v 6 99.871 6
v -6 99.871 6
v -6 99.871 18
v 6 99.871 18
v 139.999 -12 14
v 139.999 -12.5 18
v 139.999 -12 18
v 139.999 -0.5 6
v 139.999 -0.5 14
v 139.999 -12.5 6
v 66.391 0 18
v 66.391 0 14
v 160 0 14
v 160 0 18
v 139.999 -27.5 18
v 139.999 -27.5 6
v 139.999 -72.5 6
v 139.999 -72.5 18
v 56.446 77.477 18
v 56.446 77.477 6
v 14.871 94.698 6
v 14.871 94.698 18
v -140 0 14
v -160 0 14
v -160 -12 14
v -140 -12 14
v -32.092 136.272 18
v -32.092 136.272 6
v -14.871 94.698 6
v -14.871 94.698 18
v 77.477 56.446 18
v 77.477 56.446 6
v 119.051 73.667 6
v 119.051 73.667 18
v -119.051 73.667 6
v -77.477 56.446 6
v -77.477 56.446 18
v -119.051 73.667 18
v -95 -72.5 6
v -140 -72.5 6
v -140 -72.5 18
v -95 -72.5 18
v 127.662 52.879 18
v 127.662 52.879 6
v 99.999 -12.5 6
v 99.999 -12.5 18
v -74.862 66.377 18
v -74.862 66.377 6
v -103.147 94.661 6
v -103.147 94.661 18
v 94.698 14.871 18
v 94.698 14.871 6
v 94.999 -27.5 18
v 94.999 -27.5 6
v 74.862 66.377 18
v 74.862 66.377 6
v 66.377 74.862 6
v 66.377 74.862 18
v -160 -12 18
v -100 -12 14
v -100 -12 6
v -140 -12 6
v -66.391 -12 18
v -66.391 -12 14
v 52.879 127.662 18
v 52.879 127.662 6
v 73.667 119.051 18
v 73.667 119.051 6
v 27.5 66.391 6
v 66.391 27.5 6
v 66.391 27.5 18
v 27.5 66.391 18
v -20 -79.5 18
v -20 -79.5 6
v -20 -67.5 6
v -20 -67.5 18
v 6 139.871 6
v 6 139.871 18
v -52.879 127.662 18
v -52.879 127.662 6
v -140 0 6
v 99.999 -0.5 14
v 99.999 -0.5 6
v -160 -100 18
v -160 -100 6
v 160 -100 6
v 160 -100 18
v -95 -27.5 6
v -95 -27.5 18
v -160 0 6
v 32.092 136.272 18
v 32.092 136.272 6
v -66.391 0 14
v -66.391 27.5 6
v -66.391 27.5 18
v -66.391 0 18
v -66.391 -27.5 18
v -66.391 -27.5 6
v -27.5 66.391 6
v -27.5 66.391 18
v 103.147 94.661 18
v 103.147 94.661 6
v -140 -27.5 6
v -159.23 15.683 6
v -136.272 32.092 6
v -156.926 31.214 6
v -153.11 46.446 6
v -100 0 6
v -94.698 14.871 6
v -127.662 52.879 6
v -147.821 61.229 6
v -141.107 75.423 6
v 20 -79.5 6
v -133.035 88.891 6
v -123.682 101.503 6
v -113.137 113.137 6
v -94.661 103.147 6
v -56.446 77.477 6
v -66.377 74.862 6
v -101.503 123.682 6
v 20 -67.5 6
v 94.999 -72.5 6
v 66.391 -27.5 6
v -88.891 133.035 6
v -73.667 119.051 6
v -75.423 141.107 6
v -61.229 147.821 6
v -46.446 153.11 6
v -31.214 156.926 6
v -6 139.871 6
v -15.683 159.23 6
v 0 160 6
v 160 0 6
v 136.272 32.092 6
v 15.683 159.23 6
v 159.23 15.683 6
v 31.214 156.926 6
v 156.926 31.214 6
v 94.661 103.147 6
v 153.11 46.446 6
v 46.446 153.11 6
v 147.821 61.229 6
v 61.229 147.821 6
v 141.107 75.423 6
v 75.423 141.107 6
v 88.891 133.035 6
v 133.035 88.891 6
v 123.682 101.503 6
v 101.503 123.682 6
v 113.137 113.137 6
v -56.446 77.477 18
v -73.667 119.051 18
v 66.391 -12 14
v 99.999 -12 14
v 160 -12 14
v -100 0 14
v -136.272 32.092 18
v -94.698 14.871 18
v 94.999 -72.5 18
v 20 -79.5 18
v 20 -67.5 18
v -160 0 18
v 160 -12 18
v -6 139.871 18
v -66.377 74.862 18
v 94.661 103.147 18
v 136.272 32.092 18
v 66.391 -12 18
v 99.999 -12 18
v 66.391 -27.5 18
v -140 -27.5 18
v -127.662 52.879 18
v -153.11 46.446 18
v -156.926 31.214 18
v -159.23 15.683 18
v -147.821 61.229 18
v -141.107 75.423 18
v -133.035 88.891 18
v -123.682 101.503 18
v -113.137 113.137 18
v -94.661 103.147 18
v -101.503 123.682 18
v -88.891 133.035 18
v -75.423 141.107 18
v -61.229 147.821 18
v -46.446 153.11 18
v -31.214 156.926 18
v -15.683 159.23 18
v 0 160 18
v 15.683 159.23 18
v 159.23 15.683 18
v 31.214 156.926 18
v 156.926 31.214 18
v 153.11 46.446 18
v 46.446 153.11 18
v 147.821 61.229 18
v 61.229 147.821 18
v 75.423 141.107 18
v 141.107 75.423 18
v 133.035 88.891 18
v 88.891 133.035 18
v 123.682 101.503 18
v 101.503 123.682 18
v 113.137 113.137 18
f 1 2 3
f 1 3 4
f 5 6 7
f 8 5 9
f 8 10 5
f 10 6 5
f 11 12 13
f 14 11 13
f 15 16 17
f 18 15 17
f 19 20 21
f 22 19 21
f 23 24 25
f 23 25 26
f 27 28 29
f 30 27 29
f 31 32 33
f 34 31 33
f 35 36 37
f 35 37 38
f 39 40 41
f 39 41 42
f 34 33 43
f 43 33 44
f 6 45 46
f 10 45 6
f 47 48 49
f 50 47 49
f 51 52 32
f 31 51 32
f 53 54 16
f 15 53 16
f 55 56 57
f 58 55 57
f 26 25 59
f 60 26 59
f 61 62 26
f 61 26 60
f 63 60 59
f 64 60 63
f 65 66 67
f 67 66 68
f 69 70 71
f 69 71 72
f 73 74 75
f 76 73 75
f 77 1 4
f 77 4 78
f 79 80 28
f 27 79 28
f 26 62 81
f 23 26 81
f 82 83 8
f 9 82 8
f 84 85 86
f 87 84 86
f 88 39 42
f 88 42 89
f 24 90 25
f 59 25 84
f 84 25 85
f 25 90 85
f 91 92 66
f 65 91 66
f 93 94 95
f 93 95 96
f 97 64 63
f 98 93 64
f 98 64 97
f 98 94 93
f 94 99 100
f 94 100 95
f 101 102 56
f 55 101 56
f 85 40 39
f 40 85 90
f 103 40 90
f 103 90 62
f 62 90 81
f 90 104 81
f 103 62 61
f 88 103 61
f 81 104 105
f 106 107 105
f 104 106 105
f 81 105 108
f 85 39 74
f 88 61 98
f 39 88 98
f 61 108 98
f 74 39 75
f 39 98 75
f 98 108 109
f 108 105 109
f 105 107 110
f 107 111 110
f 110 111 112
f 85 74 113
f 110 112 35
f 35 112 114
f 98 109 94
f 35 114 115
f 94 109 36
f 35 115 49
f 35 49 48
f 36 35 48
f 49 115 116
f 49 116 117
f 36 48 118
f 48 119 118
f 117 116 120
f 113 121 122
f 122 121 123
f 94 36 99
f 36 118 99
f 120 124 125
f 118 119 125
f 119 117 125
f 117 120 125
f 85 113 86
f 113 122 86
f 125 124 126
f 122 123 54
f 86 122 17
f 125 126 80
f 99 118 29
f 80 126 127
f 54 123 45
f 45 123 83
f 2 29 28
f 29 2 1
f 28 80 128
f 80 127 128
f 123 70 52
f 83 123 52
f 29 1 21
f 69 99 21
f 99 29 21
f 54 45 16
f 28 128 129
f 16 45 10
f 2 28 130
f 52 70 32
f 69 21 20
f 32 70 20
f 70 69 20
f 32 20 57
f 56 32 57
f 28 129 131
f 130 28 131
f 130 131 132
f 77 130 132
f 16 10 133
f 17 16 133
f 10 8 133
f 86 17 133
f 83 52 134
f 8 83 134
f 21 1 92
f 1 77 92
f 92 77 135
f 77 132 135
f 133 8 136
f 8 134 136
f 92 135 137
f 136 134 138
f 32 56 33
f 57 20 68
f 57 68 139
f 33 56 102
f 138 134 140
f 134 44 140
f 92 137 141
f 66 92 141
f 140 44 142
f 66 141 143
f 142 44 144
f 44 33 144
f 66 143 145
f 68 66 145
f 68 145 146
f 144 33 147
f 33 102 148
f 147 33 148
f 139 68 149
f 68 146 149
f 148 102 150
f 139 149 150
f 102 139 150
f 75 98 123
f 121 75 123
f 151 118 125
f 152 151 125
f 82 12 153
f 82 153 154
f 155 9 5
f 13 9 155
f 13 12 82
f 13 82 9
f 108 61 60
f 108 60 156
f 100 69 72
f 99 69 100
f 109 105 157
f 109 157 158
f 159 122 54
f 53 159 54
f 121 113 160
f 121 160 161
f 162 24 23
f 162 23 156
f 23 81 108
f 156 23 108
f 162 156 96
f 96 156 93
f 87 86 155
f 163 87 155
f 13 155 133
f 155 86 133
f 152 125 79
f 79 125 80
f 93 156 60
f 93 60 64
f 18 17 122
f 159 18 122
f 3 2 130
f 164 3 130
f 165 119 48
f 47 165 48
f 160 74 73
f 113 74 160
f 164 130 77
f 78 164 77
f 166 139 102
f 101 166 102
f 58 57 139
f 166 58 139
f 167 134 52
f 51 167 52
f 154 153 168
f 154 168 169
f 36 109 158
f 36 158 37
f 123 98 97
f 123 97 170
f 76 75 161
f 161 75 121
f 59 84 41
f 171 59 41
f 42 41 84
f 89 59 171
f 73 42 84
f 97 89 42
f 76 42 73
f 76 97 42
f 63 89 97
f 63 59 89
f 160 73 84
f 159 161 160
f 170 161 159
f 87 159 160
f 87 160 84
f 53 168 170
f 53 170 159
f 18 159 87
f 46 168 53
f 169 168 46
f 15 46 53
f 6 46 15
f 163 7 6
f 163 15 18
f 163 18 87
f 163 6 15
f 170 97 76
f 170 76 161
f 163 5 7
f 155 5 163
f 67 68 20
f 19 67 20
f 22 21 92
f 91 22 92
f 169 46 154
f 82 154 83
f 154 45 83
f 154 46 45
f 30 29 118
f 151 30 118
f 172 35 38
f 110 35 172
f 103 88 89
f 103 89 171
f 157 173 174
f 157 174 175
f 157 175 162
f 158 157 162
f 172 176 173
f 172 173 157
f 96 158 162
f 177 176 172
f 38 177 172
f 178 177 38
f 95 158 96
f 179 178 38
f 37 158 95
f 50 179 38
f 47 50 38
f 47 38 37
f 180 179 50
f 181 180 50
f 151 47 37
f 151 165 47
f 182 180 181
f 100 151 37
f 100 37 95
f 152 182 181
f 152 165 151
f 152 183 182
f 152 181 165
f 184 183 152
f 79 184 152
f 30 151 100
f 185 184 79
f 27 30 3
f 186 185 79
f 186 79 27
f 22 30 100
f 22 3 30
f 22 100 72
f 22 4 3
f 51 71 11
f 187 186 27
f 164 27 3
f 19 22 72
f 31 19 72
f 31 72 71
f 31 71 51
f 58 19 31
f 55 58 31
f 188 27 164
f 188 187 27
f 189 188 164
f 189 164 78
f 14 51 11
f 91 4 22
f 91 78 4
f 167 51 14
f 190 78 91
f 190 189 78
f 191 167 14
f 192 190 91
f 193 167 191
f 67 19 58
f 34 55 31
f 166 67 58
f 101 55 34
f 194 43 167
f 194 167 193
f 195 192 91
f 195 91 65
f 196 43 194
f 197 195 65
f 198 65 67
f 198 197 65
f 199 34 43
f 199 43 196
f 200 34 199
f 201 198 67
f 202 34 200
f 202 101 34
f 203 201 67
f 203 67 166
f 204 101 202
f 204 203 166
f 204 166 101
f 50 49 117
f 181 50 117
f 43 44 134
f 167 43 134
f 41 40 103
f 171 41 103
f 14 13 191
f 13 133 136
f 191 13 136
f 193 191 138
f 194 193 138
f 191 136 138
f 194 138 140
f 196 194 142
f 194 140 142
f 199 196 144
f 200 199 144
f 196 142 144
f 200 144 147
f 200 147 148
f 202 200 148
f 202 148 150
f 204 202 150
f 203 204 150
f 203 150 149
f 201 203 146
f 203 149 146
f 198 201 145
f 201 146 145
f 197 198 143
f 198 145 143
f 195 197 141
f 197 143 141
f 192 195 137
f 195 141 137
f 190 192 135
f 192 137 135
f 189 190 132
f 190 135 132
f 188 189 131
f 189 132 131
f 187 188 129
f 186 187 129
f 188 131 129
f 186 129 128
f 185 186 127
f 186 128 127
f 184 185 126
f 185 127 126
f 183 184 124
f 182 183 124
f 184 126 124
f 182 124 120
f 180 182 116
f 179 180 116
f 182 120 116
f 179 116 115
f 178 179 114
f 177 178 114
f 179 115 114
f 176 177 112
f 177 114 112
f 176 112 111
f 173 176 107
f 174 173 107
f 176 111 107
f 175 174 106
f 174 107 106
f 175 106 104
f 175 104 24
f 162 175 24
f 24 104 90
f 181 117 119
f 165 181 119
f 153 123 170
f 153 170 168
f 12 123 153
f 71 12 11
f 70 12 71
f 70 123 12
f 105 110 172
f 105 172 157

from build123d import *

# Parameters (mm, degrees)
SKETCH012_W      = 320
SKETCH012_H      = 12
EXTRUDE001_DEPTH = 4
SKETCH007_W      = 12
SKETCH007_H      = 40
SKETCH007_W_2    = 40
SKETCH007_H_2    = 12
EXTRUDE_DEPTH    = 12


with BuildPart() as innertemplatealignmentslot:
    # Sketch012 → Extrude001 (new body)
    with BuildSketch(Plane.XY):
        with Locations((0, -6)):
            Rectangle(SKETCH012_W, SKETCH012_H)
    extrude(amount=EXTRUDE001_DEPTH)


with BuildPart() as innertemplatealignmentslot_1:
    # Extrude001 placement: moved
    add(innertemplatealignmentslot.part.moved(Location((0, 0, 8))))


with BuildPart() as innertemplate:
    # Sketch007 → Extrude (new body)
    with BuildSketch(Plane.XY):
        with BuildLine():
            ThreePointArc((160, 0), (0, 160), (-160, 0))
            Line((-160, 0), (-160, -100))
            Line((-160, -100), (160, -100))
            Line((160, -100), (160, 0))
        make_face()
        Polygon((-140, -72.5), (-95, -72.5), (-95, -27.5), (-140, -27.5), (-140, -50), align=None, mode=Mode.SUBTRACT)
        Polygon((-136.272177, 32.091959), (-94.697598, 14.871205), (-77.476843, 56.445784), (-119.051422, 73.666538), (-127.6618, 52.879249), align=None, mode=Mode.SUBTRACT)
        Polygon((-32.091959, 136.272177), (-14.871205, 94.697598), (-56.445784, 77.476843), (-73.666538, 119.051422), (-52.879249, 127.6618), align=None, mode=Mode.SUBTRACT)
        Polygon((73.666538, 119.051422), (56.445784, 77.476843), (14.871205, 94.697598), (32.091959, 136.272177), (52.879249, 127.6618), align=None, mode=Mode.SUBTRACT)
        Polygon((136.272177, 32.091959), (94.697598, 14.871205), (77.476843, 56.445784), (119.051422, 73.666538), (127.6618, 52.879249), align=None, mode=Mode.SUBTRACT)
        Polygon((94.999107, -27.5), (139.999107, -27.5), (139.999107, -50), (139.999107, -72.5), (94.999107, -72.5), align=None, mode=Mode.SUBTRACT)
        Polygon((66.390873, -27.5), (66.390873, 27.5), (27.5, 66.390873), (-27.5, 66.390873), (-66.390873, 27.5), (-66.390873, -27.5), align=None, mode=Mode.SUBTRACT)
        Polygon((-94.661353, 103.146635), (-66.377082, 74.862363), (-74.862363, 66.377082), (-103.146635, 94.661353), (-98.903994, 98.903994), align=None, mode=Mode.SUBTRACT)
        with Locations((0, 119.871369)):
            Rectangle(SKETCH007_W, SKETCH007_H, mode=Mode.SUBTRACT)
        Polygon((103.146635, 94.661353), (74.862363, 66.377082), (66.377082, 74.862363), (94.661353, 103.146635), (98.903994, 98.903994), align=None, mode=Mode.SUBTRACT)
        with Locations((-120, -6)):
            Rectangle(SKETCH007_W_2, SKETCH007_H_2, mode=Mode.SUBTRACT)
        with Locations((119.999107, -6.5)):
            Rectangle(SKETCH007_W_2, SKETCH007_H_2, mode=Mode.SUBTRACT)
        with Locations((0, -73.5)):
            Rectangle(SKETCH007_W_2, SKETCH007_H_2, mode=Mode.SUBTRACT)
    extrude(amount=EXTRUDE_DEPTH)

    # Cut: cut InnerTemplateAlignmentSlot
    add(innertemplatealignmentslot_1.part, mode=Mode.SUBTRACT)


with BuildPart() as innertemplate_1:
    # Cut placement: moved
    add(innertemplate.part.moved(Location((0, 0, 6))))


solid = innertemplate_1.part
